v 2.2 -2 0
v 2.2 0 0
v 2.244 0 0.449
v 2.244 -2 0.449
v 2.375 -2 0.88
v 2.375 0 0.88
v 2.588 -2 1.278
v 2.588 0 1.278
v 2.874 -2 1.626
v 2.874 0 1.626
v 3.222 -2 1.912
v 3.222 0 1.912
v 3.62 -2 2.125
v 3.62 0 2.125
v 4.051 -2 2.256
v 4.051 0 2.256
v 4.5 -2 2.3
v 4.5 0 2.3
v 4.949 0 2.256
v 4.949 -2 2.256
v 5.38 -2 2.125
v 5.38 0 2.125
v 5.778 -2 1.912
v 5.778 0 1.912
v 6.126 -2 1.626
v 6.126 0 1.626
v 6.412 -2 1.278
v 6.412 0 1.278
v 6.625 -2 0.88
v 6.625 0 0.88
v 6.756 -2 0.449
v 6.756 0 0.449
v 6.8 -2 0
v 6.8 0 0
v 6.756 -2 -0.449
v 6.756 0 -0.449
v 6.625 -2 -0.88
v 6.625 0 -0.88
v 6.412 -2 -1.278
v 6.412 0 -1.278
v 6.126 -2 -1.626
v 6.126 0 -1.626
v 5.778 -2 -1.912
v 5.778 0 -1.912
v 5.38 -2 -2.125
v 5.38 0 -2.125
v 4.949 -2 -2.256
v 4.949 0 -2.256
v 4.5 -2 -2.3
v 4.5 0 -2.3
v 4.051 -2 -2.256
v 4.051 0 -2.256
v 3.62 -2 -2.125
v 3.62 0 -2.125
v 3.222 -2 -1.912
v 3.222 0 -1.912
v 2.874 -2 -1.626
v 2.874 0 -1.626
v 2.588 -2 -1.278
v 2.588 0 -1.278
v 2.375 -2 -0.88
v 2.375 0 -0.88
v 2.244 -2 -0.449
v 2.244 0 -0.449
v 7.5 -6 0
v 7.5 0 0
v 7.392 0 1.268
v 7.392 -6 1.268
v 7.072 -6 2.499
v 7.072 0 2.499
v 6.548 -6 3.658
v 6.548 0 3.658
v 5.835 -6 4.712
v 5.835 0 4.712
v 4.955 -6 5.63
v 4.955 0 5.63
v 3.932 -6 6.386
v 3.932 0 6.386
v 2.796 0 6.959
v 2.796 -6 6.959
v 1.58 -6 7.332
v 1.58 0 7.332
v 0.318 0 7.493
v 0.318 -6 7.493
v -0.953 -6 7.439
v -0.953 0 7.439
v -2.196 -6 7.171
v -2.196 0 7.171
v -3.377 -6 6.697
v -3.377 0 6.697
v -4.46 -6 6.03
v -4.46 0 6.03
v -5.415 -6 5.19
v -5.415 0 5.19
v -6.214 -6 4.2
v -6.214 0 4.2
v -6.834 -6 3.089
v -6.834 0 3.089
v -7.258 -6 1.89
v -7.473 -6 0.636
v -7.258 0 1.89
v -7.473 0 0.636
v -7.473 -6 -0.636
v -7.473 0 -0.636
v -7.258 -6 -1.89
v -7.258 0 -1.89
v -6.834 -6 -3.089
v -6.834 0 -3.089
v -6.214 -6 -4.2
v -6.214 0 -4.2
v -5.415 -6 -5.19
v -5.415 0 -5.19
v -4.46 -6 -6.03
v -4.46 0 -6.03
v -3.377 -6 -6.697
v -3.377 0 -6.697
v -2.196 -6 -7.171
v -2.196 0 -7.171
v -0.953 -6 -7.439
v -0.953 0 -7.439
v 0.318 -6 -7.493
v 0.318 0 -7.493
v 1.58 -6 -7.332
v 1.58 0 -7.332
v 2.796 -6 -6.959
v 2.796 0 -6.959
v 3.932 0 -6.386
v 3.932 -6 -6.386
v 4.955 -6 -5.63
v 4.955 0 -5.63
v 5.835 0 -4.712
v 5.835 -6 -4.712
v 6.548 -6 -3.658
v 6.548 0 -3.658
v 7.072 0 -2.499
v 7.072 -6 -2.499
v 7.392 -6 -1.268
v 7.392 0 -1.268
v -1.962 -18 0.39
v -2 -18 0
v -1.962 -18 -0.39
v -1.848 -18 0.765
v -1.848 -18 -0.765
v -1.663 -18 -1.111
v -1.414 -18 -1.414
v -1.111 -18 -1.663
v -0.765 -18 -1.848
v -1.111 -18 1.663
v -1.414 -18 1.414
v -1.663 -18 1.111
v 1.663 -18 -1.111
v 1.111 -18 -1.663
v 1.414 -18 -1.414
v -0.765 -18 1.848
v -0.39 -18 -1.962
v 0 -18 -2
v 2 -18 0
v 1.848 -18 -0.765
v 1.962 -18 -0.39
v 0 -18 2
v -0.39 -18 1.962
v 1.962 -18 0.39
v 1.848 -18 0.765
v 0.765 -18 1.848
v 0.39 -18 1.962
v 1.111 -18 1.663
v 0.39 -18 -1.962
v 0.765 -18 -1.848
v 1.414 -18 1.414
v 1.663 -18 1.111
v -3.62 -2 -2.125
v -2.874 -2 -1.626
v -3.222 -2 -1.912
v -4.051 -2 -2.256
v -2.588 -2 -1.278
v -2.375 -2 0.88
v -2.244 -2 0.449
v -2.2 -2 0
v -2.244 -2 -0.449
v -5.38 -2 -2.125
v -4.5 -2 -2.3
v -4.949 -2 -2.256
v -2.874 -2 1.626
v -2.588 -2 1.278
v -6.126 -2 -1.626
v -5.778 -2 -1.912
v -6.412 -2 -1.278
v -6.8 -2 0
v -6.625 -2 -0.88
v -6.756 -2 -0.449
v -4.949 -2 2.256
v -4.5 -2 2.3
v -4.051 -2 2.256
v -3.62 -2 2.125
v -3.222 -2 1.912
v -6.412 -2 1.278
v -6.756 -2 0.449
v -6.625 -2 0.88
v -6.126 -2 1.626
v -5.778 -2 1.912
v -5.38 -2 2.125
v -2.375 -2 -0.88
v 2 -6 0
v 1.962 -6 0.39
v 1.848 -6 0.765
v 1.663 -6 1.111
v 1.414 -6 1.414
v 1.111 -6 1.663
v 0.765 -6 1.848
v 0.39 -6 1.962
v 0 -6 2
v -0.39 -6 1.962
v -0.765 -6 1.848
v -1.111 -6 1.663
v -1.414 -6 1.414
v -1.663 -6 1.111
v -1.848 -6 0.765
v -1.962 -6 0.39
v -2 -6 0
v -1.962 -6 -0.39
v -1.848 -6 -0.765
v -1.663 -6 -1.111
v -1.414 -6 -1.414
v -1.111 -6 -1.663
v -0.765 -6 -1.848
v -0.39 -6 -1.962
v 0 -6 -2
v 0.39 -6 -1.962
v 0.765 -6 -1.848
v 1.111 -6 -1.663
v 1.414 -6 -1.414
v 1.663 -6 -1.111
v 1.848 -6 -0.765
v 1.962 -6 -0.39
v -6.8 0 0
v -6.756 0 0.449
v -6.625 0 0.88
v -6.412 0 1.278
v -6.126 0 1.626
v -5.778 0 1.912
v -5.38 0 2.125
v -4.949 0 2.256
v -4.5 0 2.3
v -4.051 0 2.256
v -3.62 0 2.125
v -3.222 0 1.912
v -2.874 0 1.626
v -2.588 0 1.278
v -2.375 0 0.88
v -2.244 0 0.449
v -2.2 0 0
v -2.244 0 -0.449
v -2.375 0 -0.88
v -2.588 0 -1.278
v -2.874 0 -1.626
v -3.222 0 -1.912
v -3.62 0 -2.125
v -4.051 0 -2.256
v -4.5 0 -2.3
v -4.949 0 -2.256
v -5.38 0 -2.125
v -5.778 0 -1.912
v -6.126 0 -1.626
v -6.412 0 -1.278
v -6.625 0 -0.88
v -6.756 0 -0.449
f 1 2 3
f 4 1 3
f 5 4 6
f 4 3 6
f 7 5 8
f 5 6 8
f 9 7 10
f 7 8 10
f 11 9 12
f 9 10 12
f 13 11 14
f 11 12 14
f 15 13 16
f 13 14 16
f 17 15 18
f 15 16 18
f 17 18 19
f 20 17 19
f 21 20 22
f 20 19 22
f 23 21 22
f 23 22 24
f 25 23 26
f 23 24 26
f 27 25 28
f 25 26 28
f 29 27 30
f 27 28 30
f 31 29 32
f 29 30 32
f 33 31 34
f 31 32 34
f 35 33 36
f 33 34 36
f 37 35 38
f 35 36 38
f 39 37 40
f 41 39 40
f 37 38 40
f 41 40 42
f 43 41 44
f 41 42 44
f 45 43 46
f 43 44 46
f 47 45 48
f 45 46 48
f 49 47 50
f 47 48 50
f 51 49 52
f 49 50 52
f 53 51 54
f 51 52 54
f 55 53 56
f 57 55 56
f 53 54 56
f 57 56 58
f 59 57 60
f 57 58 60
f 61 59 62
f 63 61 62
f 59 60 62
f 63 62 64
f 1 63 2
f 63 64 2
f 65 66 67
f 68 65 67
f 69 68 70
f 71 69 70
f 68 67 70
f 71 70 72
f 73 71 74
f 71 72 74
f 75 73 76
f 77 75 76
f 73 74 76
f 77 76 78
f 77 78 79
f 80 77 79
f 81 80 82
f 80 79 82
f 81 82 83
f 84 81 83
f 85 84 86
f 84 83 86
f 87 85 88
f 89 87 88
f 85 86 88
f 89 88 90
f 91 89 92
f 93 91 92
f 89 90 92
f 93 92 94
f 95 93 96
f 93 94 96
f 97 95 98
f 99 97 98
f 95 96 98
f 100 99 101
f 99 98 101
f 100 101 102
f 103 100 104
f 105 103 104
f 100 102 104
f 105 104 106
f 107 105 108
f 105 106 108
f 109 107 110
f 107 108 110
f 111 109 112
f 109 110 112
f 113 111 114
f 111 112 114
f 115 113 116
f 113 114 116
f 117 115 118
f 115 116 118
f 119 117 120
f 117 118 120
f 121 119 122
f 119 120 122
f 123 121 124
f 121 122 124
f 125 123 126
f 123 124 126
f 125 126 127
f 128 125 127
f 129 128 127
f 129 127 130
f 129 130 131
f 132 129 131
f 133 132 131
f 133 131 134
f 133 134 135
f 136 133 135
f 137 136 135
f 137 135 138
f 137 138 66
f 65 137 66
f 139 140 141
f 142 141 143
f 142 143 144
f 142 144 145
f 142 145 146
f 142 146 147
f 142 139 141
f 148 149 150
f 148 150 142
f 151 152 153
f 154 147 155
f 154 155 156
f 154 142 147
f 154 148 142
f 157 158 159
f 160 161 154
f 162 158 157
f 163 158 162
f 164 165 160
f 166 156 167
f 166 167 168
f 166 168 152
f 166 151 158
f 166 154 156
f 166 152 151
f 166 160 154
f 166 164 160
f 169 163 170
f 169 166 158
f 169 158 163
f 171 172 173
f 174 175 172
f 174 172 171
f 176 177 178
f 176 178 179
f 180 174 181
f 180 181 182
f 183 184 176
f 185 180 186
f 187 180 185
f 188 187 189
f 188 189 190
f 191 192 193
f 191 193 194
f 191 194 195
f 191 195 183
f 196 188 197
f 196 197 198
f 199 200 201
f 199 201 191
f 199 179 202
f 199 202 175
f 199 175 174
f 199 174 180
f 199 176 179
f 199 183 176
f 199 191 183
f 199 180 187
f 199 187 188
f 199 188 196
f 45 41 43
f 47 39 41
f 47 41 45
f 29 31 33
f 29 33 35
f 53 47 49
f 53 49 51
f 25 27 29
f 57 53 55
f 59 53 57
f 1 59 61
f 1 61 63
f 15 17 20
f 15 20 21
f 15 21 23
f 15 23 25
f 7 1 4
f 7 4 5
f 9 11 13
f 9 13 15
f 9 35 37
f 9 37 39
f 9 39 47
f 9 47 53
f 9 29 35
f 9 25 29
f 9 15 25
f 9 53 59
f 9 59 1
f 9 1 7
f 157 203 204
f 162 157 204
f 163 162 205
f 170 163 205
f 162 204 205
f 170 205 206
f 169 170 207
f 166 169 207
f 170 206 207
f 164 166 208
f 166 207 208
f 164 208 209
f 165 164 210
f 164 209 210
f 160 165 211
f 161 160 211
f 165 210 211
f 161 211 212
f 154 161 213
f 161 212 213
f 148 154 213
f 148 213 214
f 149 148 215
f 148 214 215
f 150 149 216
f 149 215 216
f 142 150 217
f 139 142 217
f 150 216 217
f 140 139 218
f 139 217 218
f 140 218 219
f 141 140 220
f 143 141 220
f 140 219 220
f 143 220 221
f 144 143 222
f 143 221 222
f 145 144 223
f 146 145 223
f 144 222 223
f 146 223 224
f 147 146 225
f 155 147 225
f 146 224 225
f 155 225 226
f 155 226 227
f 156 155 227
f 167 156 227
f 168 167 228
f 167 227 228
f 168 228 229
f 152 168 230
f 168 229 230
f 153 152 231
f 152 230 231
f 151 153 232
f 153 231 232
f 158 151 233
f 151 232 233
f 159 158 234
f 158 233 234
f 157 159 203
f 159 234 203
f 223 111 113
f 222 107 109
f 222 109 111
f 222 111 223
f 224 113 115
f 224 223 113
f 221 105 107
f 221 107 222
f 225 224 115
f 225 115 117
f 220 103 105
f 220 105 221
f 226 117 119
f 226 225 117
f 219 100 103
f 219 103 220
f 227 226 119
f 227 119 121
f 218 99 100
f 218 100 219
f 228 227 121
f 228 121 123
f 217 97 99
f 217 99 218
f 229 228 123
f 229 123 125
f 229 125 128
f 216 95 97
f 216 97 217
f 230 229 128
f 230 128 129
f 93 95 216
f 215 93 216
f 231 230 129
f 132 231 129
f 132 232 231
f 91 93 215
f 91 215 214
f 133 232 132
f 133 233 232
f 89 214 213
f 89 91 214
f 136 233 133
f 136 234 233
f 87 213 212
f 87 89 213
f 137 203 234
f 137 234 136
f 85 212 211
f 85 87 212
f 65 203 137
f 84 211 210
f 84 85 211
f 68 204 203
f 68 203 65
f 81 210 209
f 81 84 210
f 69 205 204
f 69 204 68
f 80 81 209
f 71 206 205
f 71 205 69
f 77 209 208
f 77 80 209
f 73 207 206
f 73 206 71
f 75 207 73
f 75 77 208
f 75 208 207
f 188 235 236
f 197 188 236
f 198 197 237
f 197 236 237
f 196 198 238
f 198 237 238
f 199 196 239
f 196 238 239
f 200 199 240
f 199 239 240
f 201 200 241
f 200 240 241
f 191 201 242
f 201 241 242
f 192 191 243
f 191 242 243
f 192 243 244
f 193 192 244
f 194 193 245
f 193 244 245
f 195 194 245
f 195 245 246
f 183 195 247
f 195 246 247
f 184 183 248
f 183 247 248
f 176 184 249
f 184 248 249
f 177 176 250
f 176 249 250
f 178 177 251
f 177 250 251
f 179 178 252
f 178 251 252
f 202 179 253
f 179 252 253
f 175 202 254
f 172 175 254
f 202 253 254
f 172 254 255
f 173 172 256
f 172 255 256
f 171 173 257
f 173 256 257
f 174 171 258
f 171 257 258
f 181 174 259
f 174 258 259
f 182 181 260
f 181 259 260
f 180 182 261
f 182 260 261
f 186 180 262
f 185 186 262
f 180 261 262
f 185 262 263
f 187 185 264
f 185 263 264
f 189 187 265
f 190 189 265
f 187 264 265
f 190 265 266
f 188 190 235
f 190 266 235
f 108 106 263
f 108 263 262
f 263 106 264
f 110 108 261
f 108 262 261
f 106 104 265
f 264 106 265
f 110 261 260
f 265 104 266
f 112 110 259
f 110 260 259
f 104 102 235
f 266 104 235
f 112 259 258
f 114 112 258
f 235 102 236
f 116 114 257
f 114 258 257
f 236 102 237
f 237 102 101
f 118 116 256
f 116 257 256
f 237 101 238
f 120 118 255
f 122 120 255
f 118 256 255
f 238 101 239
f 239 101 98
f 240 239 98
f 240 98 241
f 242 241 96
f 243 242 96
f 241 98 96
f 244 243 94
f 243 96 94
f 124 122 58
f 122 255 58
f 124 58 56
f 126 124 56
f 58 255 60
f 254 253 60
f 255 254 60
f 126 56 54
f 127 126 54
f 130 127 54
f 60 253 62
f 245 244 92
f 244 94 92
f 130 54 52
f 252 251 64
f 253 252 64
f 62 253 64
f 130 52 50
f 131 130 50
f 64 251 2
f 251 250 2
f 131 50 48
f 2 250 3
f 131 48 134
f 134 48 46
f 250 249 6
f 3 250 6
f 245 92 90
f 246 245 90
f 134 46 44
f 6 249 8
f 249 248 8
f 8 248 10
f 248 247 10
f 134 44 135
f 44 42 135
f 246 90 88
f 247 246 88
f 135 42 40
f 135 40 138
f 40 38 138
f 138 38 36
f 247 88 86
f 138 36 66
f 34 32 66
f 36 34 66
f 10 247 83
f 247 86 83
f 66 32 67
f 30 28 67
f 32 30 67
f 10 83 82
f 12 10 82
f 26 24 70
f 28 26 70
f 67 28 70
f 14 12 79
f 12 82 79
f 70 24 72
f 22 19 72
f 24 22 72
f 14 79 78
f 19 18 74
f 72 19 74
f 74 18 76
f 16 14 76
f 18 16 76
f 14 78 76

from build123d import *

# Parameters (mm, degrees)
F0_R     = 7.5
F1_DEPTH = 6
F2_R     = 2
F3_DEPTH = 12
F4_R     = 2.3
F5_DEPTH = 2


with BuildPart() as f1:
    # F0 (on Front) → F1 (new body)
    with BuildSketch(Plane.XZ):
        Circle(F0_R)
    extrude(amount=F1_DEPTH)

    # F2 (on face) → F3 (join)
    with BuildSketch(Plane.XZ.offset(6)):
        Circle(F2_R)
    extrude(amount=F3_DEPTH)

    # F4 (on face) → F5 (cut)
    with BuildSketch(Plane(origin=(0, 0, 0), x_dir=(-1, 0, 0), z_dir=(0, 1, 0))):
        with Locations((-4.5, 0)):
            Circle(F4_R)
        with Locations((4.5, 0)):
            Circle(F4_R)
    extrude(amount=-F5_DEPTH, mode=Mode.SUBTRACT)


solid = f1.part
